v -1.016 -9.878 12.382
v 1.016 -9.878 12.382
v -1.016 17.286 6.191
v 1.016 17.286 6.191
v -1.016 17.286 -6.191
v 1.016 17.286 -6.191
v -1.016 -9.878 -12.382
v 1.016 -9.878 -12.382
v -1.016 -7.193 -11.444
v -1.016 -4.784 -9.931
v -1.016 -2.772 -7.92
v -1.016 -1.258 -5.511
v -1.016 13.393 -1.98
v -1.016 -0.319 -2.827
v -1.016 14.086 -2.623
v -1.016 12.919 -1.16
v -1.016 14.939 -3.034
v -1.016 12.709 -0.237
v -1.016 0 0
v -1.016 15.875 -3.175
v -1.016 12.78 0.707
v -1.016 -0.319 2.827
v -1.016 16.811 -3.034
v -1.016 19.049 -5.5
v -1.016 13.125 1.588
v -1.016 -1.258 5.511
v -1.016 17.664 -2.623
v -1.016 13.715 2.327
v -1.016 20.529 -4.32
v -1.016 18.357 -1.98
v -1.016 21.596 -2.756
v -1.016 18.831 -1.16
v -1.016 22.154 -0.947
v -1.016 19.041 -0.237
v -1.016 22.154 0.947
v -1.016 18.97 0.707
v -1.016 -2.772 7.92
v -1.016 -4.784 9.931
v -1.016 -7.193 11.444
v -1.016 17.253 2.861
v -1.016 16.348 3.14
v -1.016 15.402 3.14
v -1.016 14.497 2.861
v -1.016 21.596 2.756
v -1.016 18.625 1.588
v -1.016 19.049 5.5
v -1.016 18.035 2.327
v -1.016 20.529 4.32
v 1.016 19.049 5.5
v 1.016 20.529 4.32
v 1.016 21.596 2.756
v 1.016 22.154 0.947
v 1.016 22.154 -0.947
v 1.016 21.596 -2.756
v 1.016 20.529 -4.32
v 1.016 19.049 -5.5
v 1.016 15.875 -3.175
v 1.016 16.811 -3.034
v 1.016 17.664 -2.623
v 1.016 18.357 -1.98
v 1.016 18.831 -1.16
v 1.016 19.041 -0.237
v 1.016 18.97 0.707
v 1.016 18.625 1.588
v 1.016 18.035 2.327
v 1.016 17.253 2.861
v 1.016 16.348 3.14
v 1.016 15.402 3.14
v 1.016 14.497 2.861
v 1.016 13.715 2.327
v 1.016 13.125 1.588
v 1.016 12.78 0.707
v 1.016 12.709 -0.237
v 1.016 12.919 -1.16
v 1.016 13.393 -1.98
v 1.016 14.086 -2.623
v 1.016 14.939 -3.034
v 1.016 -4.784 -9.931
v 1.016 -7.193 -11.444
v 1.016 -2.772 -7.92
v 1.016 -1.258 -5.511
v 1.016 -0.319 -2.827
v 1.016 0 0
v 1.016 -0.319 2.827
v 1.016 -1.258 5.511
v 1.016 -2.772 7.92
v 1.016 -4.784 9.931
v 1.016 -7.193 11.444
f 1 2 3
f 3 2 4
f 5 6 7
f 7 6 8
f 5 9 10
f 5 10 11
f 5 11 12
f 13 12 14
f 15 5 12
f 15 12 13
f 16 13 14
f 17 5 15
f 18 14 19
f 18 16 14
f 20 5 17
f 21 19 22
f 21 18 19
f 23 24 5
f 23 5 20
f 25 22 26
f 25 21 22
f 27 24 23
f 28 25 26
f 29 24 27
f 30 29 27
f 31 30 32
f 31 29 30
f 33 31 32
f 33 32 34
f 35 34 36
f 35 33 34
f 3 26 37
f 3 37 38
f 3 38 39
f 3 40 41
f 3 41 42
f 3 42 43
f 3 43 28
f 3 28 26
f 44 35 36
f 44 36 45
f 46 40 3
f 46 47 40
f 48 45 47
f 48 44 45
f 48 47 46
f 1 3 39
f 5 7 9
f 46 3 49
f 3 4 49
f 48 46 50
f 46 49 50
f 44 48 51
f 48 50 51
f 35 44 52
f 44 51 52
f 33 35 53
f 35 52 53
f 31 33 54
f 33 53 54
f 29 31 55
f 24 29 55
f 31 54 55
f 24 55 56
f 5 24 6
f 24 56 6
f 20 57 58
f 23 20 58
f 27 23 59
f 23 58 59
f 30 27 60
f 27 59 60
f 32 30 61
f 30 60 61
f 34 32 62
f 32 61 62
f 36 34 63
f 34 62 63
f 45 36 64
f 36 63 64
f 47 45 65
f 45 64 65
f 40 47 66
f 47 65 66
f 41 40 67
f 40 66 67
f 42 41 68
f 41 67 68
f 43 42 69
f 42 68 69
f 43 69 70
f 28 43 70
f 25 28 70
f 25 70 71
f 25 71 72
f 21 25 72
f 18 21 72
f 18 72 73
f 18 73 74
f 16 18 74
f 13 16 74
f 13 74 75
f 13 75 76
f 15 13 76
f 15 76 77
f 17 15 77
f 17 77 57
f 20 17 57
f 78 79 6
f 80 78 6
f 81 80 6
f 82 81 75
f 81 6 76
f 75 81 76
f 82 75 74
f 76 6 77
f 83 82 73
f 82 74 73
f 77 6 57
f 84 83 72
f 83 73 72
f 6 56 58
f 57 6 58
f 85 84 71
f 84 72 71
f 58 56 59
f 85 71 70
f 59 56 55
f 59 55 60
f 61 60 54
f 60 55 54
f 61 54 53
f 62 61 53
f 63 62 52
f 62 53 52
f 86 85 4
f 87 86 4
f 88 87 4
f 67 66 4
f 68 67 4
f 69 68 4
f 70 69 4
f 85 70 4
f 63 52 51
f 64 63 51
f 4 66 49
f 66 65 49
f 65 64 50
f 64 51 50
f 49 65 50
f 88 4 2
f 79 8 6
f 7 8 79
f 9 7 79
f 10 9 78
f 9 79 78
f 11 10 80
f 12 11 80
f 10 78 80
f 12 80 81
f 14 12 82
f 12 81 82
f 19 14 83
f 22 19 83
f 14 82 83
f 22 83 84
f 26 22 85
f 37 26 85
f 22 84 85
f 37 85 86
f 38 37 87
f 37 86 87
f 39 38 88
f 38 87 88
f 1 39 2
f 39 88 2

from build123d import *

# Parameters (mm, degrees)
BOSS_EXTRUDE1_DEPTH = 1.016
SKETCH2_R           = 3.175
CUT_EXTRUDE1_DEPTH  = 3.032


with BuildPart() as part:
    # Sketch1 → Boss-Extrude1 (new body, symmetric)
    with BuildSketch(Plane(origin=(0, 0, 0), x_dir=(0, 0, -1), z_dir=(1, 0, 0))):
        with BuildLine():
            Line((-12.382449747, -9.877777778), (-6.191224873, 17.286111111))
            ThreePointArc((-6.191224873, 17.286111111), (0, 22.225), (6.191224873, 17.286111111))
            Line((6.191224873, 17.286111111), (12.382449747, -9.877777778))
            ThreePointArc((12.382449747, -9.877777778), (0, 0), (-12.382449747, -9.877777778))
        make_face()
    extrude(amount=BOSS_EXTRUDE1_DEPTH, both=True)

    # Sketch2 → Cut-Extrude1 (cut, through all)
    with BuildSketch(Plane(origin=(1.016, 0, 0), x_dir=(0, 0, -1), z_dir=(1, 0, 0))):
        with Locations((0, 15.875)):
            Circle(SKETCH2_R)
    extrude(amount=-CUT_EXTRUDE1_DEPTH, mode=Mode.SUBTRACT)


solid = part.part
